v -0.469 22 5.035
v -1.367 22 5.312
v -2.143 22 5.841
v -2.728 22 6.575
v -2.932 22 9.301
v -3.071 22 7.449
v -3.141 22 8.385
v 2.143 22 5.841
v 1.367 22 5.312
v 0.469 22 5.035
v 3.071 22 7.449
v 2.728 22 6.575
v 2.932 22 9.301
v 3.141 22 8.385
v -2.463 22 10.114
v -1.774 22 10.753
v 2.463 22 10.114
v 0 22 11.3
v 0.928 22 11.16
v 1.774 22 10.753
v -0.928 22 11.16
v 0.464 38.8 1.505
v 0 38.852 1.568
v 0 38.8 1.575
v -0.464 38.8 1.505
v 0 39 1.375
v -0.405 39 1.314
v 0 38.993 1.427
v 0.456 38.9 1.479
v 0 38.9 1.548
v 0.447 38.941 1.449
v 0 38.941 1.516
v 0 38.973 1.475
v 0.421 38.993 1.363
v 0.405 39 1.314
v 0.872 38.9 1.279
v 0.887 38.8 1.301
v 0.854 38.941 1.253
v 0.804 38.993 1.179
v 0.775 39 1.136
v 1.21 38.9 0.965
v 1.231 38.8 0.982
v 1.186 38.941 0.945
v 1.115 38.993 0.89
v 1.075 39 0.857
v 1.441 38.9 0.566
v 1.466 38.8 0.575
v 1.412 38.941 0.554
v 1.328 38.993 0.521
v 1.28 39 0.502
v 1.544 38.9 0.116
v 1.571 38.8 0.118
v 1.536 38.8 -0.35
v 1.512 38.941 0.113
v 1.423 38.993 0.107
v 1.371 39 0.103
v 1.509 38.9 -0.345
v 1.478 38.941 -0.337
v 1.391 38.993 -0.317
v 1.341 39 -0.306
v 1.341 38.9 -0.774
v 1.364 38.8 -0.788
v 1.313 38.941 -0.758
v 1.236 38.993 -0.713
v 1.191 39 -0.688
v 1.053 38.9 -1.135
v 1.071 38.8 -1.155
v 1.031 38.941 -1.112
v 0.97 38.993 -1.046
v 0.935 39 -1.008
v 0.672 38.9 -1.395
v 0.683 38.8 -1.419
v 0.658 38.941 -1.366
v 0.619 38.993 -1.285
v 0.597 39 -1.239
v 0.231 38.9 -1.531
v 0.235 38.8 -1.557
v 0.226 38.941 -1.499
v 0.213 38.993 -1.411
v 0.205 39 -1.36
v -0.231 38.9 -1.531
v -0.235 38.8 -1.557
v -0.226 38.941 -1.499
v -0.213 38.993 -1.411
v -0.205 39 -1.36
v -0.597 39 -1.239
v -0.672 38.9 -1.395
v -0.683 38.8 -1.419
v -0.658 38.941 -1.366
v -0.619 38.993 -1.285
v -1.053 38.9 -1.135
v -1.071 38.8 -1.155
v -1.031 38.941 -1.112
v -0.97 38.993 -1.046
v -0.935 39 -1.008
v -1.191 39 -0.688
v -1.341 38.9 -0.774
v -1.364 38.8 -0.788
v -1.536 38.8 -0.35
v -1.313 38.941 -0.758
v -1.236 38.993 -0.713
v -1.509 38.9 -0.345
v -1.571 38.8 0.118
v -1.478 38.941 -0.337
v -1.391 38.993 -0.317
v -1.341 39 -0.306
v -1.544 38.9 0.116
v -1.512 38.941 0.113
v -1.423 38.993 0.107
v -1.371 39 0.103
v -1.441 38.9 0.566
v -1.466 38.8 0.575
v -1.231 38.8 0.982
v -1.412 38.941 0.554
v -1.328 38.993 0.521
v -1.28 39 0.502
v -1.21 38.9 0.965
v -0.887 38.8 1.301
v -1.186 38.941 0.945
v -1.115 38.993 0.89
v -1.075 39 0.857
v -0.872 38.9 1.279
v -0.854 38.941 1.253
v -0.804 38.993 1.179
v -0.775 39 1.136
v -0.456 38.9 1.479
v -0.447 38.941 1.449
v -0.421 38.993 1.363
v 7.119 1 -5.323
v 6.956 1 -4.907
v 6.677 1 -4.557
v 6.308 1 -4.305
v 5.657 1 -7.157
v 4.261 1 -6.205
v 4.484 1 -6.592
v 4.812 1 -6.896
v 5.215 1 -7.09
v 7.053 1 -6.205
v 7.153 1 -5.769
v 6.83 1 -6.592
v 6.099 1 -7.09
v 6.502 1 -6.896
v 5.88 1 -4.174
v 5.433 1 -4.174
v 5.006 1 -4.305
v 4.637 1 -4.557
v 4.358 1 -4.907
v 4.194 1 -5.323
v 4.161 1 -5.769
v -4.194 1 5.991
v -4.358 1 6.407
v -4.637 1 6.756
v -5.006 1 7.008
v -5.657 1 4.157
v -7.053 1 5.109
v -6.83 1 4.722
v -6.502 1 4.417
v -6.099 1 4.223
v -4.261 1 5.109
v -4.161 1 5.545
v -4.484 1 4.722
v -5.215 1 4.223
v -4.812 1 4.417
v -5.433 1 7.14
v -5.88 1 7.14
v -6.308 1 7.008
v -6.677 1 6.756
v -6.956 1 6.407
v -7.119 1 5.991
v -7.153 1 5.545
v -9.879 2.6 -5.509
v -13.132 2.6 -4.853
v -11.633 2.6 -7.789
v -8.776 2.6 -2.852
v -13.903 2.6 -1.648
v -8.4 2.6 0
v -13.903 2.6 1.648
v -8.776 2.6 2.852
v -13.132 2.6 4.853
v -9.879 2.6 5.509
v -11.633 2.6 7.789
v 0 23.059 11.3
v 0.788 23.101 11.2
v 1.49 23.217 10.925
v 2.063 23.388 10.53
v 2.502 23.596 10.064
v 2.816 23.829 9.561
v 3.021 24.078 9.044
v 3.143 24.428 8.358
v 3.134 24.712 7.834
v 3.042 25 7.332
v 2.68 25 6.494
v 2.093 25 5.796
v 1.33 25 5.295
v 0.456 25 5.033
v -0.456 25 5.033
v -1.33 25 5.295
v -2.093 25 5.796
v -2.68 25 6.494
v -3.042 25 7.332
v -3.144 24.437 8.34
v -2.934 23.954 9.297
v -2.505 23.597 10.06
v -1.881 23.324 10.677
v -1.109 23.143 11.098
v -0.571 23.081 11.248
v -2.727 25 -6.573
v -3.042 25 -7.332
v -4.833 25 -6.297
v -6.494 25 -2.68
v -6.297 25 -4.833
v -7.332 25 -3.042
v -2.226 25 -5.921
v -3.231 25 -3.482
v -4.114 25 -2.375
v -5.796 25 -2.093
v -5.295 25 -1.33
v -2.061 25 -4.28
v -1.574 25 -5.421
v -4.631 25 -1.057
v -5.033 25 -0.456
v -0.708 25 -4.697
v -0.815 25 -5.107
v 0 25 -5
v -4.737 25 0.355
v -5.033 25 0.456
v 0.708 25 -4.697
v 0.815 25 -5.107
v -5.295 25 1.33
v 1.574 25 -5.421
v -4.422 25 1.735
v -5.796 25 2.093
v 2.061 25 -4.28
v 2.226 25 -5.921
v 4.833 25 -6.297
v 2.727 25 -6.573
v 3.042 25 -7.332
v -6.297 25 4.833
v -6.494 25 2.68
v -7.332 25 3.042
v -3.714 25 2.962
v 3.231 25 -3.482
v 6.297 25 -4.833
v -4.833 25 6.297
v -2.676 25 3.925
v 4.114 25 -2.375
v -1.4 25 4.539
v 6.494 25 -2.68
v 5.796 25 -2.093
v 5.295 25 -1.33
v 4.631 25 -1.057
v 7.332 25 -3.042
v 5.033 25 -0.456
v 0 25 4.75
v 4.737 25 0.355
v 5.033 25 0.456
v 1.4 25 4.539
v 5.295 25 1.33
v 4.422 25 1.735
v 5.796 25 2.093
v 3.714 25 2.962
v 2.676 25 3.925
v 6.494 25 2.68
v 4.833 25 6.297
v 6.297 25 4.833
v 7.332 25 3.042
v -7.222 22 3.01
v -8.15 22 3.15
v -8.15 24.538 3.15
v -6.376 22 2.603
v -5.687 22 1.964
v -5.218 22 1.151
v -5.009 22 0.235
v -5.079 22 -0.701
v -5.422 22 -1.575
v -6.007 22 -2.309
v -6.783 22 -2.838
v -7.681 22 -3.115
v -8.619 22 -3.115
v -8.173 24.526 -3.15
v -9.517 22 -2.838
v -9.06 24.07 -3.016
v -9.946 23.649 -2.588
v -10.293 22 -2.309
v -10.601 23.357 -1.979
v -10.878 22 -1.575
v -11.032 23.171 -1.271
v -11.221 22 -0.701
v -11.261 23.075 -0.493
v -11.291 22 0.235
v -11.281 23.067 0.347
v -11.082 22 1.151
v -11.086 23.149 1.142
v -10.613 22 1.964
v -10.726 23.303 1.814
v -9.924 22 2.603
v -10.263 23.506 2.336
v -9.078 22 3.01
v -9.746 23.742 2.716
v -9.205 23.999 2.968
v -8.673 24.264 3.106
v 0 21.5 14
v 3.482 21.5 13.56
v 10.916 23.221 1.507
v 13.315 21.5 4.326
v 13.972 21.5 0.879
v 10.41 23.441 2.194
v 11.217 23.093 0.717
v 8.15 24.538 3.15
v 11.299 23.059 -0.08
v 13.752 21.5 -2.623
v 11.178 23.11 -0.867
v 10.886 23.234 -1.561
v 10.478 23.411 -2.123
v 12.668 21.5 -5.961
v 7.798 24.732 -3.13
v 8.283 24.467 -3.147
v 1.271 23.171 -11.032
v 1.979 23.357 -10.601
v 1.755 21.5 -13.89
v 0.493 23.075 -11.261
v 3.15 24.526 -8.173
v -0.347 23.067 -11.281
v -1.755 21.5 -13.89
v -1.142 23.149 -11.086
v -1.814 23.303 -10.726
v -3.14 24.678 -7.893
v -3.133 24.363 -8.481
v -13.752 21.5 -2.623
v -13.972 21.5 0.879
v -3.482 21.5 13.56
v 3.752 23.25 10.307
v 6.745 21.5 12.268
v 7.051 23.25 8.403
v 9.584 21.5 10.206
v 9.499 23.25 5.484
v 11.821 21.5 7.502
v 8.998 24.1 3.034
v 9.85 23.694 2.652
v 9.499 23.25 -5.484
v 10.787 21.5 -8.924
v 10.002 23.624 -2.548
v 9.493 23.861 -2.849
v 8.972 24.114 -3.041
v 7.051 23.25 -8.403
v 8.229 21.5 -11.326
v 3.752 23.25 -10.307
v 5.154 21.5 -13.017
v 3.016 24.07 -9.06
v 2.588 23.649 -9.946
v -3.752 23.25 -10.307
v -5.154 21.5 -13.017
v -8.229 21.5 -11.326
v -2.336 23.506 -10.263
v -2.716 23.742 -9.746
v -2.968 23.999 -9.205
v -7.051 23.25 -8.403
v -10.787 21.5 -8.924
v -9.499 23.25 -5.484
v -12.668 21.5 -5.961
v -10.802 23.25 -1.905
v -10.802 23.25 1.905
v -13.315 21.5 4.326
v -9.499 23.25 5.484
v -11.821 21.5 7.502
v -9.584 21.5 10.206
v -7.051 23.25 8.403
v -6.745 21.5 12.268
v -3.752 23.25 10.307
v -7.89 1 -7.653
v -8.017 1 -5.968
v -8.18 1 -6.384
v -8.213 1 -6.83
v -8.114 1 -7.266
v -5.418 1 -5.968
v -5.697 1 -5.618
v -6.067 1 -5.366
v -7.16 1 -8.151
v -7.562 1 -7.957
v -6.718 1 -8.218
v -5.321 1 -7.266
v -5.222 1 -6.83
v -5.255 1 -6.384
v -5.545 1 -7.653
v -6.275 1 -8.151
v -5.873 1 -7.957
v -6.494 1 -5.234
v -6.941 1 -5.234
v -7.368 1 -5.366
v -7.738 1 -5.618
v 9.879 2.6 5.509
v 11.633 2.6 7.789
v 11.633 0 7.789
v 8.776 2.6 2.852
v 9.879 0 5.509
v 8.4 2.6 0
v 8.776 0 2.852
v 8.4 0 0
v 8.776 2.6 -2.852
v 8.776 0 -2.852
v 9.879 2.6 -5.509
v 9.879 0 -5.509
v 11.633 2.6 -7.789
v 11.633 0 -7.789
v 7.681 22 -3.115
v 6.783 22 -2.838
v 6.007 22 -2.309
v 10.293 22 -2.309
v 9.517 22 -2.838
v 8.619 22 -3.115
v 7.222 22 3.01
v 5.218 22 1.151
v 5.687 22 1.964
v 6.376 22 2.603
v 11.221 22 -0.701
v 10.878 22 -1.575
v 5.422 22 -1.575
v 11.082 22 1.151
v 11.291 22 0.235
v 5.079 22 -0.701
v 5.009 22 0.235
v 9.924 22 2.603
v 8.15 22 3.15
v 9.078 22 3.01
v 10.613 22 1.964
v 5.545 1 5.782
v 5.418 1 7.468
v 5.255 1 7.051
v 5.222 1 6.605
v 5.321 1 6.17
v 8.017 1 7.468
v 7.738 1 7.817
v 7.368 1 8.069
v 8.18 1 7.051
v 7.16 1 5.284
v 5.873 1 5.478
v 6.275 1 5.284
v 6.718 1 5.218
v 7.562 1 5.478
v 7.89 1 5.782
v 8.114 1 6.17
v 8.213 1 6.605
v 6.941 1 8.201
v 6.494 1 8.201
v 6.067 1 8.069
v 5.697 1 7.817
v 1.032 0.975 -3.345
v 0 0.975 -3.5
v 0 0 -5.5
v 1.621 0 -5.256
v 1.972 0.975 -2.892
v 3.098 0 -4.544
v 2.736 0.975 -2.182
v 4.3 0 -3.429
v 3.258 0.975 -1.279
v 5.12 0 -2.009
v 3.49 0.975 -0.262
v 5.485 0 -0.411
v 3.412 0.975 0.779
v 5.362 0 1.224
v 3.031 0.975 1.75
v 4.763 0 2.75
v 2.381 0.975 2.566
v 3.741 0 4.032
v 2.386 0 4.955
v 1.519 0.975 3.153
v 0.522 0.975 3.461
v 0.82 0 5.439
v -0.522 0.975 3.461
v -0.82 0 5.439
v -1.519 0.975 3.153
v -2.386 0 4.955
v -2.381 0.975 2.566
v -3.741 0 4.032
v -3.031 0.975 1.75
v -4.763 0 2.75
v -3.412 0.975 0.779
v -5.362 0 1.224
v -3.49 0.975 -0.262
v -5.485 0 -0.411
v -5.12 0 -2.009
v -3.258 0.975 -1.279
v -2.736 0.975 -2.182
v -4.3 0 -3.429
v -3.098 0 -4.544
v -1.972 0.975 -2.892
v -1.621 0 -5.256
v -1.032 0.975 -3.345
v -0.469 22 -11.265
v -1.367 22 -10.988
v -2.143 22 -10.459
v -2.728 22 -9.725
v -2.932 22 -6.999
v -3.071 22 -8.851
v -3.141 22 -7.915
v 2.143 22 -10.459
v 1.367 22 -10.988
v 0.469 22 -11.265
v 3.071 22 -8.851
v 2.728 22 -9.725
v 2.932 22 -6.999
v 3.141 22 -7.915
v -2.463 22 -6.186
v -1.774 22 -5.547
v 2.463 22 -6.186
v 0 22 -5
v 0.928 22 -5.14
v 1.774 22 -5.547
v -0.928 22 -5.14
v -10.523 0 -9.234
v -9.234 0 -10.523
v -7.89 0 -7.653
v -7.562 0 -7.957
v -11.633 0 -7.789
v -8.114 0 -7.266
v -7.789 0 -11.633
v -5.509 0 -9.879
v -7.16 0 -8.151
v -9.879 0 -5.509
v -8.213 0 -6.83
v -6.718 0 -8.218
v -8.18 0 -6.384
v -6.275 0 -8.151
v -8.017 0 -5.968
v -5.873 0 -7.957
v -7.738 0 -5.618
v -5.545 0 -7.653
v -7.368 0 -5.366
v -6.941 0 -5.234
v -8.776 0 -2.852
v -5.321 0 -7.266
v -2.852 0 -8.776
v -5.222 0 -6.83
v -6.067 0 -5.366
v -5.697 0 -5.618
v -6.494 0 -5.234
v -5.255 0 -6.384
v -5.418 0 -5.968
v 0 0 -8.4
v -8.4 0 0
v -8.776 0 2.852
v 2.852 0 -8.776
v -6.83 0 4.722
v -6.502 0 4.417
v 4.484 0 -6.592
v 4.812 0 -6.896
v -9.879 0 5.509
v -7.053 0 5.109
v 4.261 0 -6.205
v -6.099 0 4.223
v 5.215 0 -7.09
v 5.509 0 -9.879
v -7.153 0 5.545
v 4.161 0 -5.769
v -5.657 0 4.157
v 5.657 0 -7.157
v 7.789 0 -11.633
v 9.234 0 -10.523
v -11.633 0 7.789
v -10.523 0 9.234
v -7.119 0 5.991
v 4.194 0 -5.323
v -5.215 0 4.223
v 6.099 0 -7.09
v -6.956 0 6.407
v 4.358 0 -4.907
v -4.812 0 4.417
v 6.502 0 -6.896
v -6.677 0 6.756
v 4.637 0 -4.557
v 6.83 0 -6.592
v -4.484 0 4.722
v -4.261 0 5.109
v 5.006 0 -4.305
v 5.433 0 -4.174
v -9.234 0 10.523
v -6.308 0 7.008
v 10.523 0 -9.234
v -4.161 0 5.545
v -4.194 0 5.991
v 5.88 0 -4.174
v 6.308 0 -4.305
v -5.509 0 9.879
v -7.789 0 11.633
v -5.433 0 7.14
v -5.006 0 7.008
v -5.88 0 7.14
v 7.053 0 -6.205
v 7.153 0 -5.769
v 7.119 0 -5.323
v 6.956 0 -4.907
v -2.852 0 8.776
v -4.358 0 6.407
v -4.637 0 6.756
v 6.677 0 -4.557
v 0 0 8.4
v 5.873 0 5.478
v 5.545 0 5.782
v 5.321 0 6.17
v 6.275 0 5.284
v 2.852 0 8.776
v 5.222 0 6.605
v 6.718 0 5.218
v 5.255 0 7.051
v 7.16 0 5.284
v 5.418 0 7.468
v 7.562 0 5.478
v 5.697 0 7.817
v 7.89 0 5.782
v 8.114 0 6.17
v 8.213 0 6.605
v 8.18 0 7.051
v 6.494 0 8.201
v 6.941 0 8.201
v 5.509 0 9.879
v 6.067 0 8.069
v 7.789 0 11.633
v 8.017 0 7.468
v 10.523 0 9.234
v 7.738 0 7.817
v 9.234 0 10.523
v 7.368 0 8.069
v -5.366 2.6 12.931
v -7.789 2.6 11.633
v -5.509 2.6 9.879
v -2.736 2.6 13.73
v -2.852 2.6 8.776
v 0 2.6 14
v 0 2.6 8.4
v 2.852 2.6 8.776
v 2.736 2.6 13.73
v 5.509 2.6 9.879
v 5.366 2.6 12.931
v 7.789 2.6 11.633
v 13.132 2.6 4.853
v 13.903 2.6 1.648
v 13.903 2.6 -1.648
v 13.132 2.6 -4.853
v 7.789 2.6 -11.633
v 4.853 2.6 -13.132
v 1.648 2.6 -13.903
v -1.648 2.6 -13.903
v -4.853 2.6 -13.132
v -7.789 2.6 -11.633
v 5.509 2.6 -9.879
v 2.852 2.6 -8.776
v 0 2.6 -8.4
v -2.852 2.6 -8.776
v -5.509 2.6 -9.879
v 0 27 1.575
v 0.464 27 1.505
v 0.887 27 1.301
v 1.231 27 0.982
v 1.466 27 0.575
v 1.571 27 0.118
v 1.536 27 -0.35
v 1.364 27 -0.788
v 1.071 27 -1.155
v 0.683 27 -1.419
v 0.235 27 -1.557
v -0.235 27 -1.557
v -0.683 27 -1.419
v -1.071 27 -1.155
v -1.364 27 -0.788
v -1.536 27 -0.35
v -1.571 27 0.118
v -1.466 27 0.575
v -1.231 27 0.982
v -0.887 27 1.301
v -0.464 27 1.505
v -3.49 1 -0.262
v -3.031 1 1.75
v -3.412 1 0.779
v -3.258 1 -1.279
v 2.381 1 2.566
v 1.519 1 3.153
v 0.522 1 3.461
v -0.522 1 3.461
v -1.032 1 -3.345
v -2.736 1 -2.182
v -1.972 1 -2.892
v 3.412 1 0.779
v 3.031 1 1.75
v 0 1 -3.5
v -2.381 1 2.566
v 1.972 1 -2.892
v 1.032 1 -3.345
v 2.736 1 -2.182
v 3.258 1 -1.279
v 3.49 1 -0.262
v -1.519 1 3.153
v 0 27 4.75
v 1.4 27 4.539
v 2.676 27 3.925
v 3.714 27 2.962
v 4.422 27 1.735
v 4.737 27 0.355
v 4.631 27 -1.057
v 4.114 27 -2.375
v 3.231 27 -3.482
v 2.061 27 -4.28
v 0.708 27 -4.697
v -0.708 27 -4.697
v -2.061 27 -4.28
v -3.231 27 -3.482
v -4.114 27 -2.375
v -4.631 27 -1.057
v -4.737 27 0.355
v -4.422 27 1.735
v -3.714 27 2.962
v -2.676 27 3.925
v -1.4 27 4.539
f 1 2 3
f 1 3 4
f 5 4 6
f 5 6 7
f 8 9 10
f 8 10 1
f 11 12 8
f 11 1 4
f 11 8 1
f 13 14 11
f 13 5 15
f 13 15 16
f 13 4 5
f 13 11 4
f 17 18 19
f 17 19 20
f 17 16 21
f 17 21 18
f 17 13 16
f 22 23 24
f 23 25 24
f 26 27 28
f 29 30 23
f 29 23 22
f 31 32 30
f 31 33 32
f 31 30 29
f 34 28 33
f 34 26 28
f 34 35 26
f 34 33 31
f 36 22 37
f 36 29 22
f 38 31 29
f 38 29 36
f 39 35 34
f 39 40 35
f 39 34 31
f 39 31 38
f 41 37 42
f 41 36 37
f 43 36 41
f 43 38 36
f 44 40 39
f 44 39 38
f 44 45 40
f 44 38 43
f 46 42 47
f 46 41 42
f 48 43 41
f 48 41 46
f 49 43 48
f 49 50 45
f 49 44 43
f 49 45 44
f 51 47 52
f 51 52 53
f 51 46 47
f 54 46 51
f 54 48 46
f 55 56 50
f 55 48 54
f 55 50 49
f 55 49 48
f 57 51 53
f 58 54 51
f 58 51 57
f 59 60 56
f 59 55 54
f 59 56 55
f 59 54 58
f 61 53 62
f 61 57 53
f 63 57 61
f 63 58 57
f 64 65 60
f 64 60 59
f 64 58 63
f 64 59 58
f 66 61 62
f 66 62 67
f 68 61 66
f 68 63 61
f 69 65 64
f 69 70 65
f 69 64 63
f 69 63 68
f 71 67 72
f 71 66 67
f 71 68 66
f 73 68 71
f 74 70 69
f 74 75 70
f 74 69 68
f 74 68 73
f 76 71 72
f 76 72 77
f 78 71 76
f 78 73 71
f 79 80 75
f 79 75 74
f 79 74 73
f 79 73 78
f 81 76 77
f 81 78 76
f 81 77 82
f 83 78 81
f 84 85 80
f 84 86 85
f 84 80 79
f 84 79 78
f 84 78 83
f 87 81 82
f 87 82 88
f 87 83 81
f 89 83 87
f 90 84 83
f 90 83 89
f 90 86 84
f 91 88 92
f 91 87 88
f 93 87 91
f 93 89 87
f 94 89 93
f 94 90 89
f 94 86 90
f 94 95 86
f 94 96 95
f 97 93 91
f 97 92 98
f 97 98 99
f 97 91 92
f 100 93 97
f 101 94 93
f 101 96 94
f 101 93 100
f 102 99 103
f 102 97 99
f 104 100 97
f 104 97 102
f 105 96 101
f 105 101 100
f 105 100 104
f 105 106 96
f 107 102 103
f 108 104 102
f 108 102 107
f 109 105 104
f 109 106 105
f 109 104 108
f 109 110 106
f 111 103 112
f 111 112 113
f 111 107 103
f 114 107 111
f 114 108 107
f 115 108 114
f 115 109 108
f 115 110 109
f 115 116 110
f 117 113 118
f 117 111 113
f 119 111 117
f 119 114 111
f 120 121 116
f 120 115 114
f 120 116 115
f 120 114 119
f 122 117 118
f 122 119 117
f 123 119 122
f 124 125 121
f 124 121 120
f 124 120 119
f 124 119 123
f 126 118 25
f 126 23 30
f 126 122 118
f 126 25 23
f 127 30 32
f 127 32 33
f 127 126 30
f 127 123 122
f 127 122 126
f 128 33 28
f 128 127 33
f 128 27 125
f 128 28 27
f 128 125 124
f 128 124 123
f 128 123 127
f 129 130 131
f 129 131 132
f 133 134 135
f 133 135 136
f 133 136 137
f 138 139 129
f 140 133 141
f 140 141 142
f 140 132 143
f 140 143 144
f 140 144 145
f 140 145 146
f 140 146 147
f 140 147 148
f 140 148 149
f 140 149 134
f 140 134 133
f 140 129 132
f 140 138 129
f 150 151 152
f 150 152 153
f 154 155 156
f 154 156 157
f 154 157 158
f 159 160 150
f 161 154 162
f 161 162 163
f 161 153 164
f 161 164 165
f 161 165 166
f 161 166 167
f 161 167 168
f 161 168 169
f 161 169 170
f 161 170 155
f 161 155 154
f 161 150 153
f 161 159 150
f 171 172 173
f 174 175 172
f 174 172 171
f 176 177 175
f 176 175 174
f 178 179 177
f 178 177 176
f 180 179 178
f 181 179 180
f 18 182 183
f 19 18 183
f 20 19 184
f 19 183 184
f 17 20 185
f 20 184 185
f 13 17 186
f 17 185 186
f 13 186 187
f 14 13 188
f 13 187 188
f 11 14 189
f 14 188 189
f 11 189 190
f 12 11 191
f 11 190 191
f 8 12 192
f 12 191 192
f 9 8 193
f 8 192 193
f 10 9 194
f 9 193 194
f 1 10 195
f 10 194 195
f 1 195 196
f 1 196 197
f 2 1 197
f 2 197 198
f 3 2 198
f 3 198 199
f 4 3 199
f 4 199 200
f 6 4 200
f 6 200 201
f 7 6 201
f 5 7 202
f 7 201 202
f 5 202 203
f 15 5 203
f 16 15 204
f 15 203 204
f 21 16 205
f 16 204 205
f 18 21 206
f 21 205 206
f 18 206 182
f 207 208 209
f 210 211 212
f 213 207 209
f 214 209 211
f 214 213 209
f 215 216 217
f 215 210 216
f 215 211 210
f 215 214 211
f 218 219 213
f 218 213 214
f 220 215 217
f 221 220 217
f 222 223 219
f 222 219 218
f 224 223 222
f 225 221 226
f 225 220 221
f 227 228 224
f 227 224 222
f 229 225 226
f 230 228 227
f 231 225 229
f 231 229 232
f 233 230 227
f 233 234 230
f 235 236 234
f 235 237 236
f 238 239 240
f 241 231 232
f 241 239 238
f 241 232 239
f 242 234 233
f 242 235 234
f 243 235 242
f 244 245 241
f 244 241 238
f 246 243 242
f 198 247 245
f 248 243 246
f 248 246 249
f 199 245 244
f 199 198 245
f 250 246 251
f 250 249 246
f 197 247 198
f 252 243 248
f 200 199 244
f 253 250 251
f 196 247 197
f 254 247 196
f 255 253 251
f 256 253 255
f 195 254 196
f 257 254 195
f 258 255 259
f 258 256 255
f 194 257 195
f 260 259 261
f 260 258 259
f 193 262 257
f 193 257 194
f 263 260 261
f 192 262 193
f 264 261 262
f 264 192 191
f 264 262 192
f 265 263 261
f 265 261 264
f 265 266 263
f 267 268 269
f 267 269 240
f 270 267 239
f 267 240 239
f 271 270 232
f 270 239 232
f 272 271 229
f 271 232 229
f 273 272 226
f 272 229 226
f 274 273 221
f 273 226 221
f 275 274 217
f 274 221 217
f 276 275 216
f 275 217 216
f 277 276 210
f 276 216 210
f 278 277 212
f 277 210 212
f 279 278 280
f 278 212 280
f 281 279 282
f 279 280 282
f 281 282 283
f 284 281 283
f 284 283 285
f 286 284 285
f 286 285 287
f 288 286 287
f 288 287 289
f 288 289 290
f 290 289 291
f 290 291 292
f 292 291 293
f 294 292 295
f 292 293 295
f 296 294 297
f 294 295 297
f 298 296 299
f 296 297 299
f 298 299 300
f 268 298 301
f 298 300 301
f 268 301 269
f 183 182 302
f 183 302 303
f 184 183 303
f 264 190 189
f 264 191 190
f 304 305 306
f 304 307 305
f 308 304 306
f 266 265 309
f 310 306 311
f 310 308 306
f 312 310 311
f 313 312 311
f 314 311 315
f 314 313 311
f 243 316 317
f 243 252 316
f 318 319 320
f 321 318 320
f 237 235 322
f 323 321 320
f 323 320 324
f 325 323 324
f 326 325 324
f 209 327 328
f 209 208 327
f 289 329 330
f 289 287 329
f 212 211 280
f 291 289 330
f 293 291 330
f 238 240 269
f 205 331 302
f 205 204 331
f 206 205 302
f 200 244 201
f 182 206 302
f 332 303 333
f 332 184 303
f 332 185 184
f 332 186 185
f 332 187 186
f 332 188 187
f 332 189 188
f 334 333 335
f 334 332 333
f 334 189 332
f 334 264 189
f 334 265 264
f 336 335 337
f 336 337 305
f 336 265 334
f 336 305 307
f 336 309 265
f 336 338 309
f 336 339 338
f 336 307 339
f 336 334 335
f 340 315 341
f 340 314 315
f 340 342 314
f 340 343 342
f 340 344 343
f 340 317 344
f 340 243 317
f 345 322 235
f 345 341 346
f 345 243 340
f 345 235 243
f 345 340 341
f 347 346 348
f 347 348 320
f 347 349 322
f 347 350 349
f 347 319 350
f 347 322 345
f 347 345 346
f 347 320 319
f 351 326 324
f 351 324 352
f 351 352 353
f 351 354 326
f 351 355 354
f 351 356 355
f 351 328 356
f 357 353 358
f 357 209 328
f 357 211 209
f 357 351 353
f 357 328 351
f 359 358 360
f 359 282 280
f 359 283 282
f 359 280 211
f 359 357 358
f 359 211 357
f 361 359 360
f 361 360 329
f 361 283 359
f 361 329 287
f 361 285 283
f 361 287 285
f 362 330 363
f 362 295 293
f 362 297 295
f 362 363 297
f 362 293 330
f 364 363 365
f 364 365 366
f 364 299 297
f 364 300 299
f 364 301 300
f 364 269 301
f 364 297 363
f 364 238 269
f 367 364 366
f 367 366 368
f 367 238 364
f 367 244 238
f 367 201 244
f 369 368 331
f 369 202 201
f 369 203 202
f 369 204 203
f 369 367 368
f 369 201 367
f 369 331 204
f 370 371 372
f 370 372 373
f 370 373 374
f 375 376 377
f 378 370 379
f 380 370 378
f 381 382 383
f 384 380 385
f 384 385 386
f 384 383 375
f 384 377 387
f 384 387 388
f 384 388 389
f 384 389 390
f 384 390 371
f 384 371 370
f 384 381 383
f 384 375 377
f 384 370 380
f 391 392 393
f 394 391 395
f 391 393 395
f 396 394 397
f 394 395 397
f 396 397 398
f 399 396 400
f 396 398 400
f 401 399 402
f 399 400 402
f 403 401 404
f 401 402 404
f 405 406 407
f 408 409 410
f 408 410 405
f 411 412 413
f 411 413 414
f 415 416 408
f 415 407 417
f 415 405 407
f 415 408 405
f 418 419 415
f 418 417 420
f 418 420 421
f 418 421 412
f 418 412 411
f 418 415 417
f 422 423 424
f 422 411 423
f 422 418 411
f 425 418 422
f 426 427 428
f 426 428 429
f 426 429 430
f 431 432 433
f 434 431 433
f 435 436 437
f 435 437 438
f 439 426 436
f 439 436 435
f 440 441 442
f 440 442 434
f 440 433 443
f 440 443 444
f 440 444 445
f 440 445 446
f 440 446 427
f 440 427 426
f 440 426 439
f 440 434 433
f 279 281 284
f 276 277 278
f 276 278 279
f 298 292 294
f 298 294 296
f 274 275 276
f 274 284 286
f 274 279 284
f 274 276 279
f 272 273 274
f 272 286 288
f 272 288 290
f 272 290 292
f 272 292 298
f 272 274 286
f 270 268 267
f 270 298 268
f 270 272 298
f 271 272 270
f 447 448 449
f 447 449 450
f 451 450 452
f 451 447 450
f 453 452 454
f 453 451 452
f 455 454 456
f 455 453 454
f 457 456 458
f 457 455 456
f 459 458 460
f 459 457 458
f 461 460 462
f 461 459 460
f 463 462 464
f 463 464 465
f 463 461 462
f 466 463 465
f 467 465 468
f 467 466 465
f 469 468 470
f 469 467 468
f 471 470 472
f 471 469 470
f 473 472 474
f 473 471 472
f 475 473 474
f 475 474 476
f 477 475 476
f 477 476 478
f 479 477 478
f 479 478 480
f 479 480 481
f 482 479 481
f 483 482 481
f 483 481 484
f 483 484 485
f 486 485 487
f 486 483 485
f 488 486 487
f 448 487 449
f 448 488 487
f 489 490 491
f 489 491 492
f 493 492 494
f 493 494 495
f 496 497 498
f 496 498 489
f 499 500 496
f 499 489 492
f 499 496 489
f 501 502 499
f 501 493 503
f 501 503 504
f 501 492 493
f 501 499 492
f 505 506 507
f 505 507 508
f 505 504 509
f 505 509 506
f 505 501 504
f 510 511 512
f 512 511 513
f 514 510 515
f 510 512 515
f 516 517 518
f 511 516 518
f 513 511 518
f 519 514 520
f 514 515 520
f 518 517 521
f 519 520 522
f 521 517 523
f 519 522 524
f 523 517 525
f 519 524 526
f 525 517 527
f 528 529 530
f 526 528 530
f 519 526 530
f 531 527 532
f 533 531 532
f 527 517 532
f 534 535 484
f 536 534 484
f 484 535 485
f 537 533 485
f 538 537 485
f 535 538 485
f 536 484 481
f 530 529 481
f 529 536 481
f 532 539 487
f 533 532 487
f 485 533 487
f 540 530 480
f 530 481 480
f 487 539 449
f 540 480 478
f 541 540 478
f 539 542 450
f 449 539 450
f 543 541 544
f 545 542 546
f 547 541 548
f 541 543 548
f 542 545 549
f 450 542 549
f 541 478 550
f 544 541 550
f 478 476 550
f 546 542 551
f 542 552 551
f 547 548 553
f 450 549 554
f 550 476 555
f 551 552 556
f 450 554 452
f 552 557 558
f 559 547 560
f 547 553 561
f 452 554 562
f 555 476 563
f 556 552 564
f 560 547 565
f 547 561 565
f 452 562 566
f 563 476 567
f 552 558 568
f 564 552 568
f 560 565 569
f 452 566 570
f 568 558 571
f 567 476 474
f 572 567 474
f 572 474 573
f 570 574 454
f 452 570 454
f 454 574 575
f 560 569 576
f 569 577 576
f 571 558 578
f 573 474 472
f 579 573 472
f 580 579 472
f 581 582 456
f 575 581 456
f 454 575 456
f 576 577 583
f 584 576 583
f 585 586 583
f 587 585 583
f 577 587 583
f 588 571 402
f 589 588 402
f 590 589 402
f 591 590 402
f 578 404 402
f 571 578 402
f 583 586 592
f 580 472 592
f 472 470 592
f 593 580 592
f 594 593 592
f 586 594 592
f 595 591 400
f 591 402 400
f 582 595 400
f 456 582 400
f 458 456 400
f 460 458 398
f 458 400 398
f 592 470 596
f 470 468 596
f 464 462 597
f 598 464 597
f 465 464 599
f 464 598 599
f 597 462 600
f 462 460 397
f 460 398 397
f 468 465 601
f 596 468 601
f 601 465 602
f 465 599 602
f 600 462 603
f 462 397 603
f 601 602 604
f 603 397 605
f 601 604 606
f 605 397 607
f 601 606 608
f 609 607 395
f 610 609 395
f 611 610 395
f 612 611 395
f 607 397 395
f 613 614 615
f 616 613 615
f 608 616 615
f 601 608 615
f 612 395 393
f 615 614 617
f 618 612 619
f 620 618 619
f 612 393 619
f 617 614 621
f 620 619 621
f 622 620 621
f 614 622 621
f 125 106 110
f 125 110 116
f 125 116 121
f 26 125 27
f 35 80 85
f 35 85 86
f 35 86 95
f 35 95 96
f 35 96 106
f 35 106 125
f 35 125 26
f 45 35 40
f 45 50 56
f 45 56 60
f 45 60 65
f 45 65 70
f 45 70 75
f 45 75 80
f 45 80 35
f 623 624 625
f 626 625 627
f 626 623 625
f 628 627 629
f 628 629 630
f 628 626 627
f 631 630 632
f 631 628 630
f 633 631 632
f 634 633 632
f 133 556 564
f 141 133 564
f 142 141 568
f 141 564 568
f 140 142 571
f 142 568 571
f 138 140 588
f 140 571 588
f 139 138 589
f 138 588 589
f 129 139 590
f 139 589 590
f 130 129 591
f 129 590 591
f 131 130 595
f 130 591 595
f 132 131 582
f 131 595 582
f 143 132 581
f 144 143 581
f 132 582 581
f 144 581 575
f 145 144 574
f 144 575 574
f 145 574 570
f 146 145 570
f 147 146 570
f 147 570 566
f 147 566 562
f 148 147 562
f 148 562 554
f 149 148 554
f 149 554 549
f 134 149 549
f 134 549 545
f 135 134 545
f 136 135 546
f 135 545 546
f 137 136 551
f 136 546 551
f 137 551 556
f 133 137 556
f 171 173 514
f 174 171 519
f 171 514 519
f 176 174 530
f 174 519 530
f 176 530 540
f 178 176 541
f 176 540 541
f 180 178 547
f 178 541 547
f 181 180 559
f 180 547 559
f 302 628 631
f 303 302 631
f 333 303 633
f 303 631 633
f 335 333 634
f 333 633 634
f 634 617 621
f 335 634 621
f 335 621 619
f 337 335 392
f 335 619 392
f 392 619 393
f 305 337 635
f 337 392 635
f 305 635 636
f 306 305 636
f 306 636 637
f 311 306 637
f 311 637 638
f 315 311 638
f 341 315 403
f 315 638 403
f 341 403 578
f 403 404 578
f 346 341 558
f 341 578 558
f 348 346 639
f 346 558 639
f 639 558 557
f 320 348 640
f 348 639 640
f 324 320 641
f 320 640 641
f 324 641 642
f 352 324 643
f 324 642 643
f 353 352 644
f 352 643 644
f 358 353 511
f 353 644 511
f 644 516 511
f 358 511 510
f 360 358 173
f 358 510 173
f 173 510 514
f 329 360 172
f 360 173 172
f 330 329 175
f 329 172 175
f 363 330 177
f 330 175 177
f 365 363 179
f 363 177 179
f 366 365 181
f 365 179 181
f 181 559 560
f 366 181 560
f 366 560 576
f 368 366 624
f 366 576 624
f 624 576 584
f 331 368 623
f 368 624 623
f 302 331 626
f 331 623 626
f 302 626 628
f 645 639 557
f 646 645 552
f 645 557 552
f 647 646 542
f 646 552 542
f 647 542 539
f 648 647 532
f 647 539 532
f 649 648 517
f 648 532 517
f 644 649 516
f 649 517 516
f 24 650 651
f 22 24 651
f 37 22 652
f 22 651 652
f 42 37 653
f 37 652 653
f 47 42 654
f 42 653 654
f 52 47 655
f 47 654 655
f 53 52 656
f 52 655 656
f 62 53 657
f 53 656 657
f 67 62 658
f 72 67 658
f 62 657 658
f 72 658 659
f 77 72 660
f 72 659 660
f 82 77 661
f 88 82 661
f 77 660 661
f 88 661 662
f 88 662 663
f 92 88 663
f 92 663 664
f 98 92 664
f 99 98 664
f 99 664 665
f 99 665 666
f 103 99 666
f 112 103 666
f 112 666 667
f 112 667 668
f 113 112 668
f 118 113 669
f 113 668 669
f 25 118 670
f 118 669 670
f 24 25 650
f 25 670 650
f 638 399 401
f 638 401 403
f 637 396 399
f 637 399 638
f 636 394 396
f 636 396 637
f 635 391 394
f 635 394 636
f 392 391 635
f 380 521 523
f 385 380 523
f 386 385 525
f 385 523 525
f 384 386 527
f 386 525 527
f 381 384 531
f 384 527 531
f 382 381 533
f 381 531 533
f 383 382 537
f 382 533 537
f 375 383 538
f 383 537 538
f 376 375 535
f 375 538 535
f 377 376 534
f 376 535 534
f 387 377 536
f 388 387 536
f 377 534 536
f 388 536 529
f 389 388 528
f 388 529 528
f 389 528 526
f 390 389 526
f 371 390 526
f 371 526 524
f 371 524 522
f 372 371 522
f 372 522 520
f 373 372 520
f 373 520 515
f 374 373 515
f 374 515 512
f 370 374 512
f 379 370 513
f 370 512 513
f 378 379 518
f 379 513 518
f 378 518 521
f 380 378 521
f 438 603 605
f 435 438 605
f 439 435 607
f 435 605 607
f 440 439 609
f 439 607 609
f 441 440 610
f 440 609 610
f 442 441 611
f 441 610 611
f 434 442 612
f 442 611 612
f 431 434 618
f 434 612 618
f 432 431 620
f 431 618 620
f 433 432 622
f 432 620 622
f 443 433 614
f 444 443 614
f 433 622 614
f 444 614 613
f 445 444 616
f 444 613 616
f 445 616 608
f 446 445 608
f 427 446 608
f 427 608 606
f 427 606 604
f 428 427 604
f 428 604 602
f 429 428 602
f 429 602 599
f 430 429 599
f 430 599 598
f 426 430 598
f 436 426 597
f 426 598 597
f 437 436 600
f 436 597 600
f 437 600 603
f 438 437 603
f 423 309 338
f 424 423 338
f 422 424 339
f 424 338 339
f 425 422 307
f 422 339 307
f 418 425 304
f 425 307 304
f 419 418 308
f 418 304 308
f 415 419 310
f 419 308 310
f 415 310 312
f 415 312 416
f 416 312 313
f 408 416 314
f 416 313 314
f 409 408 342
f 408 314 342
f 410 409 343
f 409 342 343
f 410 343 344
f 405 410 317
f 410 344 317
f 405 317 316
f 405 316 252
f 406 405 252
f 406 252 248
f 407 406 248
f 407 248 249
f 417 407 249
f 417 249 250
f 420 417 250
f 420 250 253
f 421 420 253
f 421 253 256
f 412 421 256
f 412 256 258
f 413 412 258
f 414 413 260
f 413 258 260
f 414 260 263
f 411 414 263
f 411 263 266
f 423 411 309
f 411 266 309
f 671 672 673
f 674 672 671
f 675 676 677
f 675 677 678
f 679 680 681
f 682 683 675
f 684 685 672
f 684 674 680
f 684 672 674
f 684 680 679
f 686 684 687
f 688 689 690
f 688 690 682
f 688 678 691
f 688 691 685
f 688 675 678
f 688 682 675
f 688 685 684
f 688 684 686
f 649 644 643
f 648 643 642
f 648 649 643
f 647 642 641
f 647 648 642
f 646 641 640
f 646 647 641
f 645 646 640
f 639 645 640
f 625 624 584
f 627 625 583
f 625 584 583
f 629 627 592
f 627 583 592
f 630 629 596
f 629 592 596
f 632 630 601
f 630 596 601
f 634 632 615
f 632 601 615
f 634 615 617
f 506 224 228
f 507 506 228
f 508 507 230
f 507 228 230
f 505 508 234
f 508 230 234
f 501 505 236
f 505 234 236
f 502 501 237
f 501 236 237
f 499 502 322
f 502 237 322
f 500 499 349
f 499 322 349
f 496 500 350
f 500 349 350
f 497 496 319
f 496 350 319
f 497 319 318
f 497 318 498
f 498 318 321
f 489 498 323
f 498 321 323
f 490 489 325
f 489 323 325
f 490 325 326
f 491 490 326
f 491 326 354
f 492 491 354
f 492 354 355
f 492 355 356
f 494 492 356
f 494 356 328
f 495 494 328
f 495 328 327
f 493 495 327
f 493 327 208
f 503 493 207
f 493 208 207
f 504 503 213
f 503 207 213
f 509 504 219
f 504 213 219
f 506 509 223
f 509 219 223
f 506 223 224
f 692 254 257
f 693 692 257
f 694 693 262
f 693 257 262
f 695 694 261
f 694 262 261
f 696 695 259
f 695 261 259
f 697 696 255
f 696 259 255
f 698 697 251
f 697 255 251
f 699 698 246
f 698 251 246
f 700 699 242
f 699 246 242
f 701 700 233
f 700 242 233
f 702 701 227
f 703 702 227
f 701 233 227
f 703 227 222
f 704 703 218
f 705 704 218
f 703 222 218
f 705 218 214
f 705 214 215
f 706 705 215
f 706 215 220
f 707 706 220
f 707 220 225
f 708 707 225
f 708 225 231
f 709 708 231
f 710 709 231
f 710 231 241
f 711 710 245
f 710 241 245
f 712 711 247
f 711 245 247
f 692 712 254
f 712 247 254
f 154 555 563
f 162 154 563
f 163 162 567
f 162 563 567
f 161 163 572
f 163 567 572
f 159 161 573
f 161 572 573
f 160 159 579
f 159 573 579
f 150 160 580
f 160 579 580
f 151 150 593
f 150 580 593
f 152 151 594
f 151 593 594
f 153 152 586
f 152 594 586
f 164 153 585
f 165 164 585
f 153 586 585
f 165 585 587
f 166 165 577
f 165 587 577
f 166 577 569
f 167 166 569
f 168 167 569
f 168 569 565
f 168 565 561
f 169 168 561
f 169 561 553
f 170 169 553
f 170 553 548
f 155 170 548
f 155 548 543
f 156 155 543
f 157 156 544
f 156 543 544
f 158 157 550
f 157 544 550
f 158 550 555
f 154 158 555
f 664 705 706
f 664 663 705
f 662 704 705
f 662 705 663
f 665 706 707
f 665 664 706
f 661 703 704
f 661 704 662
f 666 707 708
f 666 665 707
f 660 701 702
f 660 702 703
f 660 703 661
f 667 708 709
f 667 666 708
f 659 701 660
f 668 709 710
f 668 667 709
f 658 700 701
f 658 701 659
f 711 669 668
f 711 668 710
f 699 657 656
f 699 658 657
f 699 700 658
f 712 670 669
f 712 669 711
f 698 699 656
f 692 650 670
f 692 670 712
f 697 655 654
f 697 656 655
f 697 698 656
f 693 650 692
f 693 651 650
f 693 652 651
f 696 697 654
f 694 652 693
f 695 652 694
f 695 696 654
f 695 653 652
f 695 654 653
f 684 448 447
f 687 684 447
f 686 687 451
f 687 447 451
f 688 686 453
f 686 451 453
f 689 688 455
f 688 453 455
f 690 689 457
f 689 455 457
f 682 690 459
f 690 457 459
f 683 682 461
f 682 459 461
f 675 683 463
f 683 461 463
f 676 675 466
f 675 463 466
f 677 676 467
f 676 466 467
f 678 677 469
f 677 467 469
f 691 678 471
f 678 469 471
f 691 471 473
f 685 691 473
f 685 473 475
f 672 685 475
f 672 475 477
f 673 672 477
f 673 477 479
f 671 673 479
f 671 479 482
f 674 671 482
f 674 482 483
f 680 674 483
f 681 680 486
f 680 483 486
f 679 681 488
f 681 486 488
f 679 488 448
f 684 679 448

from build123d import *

# Parameters (mm, degrees)
SKETCH1_R           = 14
BOSS_EXTRUDE1_DEPTH = 25
CHAMFER1_SIZE       = 3.5
CHAMFER1_SIZE2      = 6.062177826
SKETCH2_R           = 4.75
BOSS_EXTRUDE2_DEPTH = 2
SKETCH3_R           = 1.575
BOSS_EXTRUDE3_DEPTH = 12
SKETCH4_R           = 11
CUT_EXTRUDE1_DEPTH  = 2.6
SKETCH5_R           = 1.5
SKETCH5_R_2         = 3.5
CUT_EXTRUDE2_DEPTH  = 1
CHAMFER2_SIZE       = 2
CHAMFER2_SIZE2      = 0.975465177
FILLET1_R           = 0.2
SKETCH6_R           = 3.15
CUT_EXTRUDE3_DEPTH  = 3


with BuildPart() as part:
    # Sketch1 → Boss-Extrude1 (new body)
    with BuildSketch(Plane(origin=(0, 0, 0), x_dir=(1, 0, 0), z_dir=(0, 1, 0))):
        with Locations(Location((0, 0, 0), (0, 0, 270))):
            Circle(SKETCH1_R)
    extrude(amount=BOSS_EXTRUDE1_DEPTH)

    # Chamfer1
    chamfer1_edges = [part.edges().sort_by_distance(p)[0] for p in [
        (0, 25, -14),
    ]]
    chamfer1_side = [part.faces().sort_by_distance(p)[0] for p in [
        (0, 12.5, -14),
    ]]
    chamfer(chamfer1_edges, length=CHAMFER1_SIZE, length2=CHAMFER1_SIZE2, reference=chamfer1_side[0])

    # Sketch2 → Boss-Extrude2 (add)
    with BuildSketch(Plane(origin=(0, 25, 0), x_dir=(1, 0, 0), z_dir=(0, 1, 0))):
        with Locations(Location((0, 0, 0), (0, 0, 270))):
            Circle(SKETCH2_R)
    extrude(amount=BOSS_EXTRUDE2_DEPTH)

    # Sketch3 → Boss-Extrude3 (add)
    with BuildSketch(Plane(origin=(0, 27, 0), x_dir=(1, 0, 0), z_dir=(0, 1, 0))):
        with Locations(Location((0, 0, 0), (0, 0, 270))):
            Circle(SKETCH3_R)
    extrude(amount=BOSS_EXTRUDE3_DEPTH)

    # Sketch4 → Cut-Extrude1 (cut)
    with BuildSketch(Plane.XZ):
        with Locations((-19.4, 0)):
            Circle(SKETCH4_R)
        with Locations((0, 19.4)):
            Circle(SKETCH4_R)
        with Locations((19.4, 0)):
            Circle(SKETCH4_R)
        with Locations((0, -19.4)):
            Circle(SKETCH4_R)
    extrude(amount=-CUT_EXTRUDE1_DEPTH, mode=Mode.SUBTRACT)

    # Sketch5 → Cut-Extrude2 (cut)
    with BuildSketch(Plane.XZ):
        with Locations(Location((-6.717514421, -6.717514421, 0), (0, 0, 270))):
            Circle(SKETCH5_R)
        with Locations(Location((-5.656854249, 5.656854249, 0), (0, 0, 270))):
            Circle(SKETCH5_R)
        with Locations(Location((6.717514421, 6.717514421, 0), (0, 0, 270))):
            Circle(SKETCH5_R)
        with Locations(Location((5.656854249, -5.656854249, 0), (0, 0, 270))):
            Circle(SKETCH5_R)
        with Locations(Location((0, 0, 0), (0, 0, 270))):
            Circle(SKETCH5_R_2)
    extrude(amount=-CUT_EXTRUDE2_DEPTH, mode=Mode.SUBTRACT)

    # Chamfer2
    chamfer2_edges = [part.edges().sort_by_distance(p)[0] for p in [
        (0, 0, 3.5),
    ]]
    chamfer2_side = [part.faces().sort_by_distance(p)[0] for p in [
        (0, 0, 8.070969364),
    ]]
    chamfer(chamfer2_edges, length=CHAMFER2_SIZE, length2=CHAMFER2_SIZE2, reference=chamfer2_side[0])

    # Fillet1
    fillet1_edges = [part.edges().sort_by_distance(p)[0] for p in [
        (0, 39, -1.575),
    ]]
    fillet(fillet1_edges, radius=FILLET1_R)

    # Sketch6 → Cut-Extrude3 (cut)
    with BuildSketch(Plane(origin=(0, 25, 0), x_dir=(1, 0, 0), z_dir=(0, 1, 0))):
        with Locations(Location((-8.15, 0, 0), (0, 0, 270))):
            Circle(SKETCH6_R)
        with Locations(Location((0, 8.15, 0), (0, 0, 270))):
            Circle(SKETCH6_R)
        with Locations(Location((8.15, 0, 0), (0, 0, 270))):
            Circle(SKETCH6_R)
        with Locations(Location((0, -8.15, 0), (0, 0, 270))):
            Circle(SKETCH6_R)
    extrude(amount=-CUT_EXTRUDE3_DEPTH, mode=Mode.SUBTRACT)


solid = part.part
